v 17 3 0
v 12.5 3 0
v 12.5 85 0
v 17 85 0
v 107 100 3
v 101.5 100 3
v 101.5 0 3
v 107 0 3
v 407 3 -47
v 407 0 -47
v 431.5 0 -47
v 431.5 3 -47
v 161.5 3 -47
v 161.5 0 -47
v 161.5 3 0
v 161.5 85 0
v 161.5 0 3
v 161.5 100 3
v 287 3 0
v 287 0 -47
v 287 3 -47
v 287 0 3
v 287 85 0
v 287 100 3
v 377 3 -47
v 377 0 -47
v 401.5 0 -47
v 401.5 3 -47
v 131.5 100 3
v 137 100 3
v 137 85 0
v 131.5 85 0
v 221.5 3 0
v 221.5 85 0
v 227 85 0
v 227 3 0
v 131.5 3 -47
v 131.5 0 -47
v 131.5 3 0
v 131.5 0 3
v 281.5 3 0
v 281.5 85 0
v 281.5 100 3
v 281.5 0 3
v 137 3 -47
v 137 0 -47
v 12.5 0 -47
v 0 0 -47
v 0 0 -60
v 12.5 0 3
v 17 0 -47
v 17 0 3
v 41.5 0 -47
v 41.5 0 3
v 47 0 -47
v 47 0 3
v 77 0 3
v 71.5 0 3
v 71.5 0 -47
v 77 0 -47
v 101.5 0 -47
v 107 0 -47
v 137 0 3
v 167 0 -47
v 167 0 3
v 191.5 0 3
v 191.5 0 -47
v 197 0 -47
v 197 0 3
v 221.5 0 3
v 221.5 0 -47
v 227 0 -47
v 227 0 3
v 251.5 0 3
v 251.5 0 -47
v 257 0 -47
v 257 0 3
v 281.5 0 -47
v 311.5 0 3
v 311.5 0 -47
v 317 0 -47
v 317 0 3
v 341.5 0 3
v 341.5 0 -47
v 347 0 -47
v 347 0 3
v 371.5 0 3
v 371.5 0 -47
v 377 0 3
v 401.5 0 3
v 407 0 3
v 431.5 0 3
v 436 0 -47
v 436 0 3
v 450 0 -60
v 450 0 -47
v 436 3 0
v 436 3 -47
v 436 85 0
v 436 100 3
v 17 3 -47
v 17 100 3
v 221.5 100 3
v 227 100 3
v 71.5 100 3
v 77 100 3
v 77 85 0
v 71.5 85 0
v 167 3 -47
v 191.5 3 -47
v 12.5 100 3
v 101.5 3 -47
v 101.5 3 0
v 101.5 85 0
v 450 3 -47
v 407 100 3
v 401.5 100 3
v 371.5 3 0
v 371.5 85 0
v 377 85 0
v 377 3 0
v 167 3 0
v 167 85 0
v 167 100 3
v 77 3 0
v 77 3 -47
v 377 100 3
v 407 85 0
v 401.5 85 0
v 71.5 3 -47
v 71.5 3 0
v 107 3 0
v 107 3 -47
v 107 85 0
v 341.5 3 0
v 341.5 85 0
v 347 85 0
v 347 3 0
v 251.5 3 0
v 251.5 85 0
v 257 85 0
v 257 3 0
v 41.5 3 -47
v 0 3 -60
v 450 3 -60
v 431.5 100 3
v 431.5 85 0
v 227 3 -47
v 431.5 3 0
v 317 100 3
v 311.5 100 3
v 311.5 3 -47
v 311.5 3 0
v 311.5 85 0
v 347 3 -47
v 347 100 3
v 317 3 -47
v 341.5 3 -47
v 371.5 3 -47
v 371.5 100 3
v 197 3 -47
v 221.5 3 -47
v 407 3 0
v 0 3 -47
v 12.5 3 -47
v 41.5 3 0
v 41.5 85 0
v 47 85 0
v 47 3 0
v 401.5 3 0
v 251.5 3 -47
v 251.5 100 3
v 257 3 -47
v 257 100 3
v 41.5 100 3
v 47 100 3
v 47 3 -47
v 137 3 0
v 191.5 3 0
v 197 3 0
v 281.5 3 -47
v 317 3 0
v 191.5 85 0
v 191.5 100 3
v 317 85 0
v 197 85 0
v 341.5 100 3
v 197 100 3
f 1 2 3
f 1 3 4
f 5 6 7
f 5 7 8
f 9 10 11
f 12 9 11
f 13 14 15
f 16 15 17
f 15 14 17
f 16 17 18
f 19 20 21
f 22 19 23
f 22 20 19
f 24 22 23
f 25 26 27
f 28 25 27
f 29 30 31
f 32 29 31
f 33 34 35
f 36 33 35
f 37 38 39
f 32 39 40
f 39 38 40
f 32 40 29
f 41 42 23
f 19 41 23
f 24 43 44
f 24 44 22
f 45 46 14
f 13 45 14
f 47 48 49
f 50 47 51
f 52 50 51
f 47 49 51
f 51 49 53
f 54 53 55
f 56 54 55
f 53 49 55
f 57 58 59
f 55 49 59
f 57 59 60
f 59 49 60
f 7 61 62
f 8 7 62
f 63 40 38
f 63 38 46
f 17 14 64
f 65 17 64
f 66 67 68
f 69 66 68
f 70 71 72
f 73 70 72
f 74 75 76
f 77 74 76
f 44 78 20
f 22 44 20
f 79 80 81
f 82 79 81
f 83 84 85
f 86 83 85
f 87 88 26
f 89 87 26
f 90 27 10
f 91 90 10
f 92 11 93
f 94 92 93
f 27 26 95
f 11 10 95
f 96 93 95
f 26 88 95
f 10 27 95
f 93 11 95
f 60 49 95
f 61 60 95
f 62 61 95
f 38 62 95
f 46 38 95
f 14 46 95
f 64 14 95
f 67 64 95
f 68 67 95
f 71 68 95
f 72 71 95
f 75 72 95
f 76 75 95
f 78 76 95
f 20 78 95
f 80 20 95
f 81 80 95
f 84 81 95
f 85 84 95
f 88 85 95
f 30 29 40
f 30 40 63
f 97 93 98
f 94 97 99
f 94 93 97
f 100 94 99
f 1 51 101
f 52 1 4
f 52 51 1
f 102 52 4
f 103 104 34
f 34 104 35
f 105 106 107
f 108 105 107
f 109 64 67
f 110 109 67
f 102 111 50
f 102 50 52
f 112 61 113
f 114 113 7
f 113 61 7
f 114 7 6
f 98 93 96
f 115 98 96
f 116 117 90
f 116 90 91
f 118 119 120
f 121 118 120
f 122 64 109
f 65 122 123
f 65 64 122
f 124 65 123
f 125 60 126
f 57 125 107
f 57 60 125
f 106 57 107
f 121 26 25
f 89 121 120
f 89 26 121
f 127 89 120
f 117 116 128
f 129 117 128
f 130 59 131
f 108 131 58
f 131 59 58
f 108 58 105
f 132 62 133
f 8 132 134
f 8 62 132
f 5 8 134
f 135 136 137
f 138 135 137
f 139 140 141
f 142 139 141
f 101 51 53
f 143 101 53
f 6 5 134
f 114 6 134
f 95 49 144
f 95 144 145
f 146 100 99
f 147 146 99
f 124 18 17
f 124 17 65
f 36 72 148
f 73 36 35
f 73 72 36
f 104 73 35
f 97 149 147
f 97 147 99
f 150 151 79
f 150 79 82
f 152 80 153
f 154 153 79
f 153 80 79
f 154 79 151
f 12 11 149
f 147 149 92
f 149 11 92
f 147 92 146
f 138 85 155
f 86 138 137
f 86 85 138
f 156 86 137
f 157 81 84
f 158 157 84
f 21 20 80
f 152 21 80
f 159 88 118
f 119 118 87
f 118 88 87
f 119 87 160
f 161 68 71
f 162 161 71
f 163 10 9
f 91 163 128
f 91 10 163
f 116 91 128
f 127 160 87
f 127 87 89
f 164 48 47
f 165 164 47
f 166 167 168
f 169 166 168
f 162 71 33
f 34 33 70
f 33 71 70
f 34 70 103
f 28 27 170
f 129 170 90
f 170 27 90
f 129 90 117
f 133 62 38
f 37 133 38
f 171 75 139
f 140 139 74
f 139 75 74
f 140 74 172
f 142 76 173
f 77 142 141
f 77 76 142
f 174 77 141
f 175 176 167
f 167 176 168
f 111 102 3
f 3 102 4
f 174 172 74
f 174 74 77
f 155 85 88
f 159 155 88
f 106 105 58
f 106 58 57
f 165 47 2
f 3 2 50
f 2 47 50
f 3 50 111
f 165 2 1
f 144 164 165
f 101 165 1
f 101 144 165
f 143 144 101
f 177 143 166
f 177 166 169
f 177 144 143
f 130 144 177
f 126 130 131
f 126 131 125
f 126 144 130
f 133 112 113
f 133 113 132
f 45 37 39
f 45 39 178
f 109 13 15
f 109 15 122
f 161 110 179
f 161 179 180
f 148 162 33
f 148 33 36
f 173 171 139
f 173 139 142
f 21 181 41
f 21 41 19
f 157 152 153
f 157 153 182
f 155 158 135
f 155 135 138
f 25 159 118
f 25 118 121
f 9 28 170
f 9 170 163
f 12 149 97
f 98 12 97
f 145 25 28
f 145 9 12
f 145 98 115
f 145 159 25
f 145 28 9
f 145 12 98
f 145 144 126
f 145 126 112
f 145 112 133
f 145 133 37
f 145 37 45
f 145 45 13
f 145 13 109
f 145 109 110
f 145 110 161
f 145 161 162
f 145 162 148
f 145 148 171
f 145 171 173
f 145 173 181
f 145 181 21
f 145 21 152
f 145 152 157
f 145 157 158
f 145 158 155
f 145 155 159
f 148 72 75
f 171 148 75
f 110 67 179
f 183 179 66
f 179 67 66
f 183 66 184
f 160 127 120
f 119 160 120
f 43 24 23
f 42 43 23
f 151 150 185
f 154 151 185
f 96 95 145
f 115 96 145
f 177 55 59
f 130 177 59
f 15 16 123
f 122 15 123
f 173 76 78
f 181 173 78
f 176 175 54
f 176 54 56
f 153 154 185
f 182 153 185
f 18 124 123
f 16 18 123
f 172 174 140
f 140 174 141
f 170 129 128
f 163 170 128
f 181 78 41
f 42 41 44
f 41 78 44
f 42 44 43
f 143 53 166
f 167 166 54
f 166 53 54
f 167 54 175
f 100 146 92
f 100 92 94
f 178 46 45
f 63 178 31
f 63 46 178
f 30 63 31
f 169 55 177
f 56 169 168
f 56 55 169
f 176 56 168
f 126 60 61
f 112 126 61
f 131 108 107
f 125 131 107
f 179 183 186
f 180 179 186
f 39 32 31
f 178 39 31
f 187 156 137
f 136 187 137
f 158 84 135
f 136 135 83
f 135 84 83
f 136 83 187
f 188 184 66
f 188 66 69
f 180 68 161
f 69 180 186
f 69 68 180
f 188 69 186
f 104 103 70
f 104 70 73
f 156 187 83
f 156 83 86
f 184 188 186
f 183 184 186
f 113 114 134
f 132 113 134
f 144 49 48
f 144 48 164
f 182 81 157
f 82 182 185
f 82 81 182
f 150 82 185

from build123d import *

# Parameters (mm, degrees)
SKETCH_1_W          = 450
SKETCH_1_H          = 60
EXTRUDE_1_DEPTH     = 3
SKETCH_2_W          = 450
SKETCH_2_H          = 100
EXTRUDE_2_DEPTH     = 3
CUT_EXTRUDE_2_DEPTH = 465.865571967
SKETCH_3_W          = 14
SKETCH_3_H          = 50
SKETCH_3_W_2        = 24.5
SKETCH_3_W_3        = 12.5
CUT_EXTRUDE_3_DEPTH = 465.865571967


with BuildPart() as part:
    # 草图1 → 凸台-拉伸1 (new body)
    with BuildSketch(Plane(origin=(0, 0, 0), x_dir=(1, 0, 0), z_dir=(0, 1, 0))):
        with Locations((225, 30)):
            Rectangle(SKETCH_1_W, SKETCH_1_H)
    extrude(amount=EXTRUDE_1_DEPTH)

    # 草图2 → 凸台-拉伸2 (add)
    with BuildSketch(Plane.XY):
        with Locations((225, 50)):
            Rectangle(SKETCH_2_W, SKETCH_2_H)
    extrude(amount=EXTRUDE_2_DEPTH)

    # 草图6 → 切除-拉伸2 (cut, through all)
    with BuildSketch(Plane(origin=(450, 0, 0), x_dir=(0, 0, -1), z_dir=(1, 0, 0))):
        Polygon((-3, 100), (0, 85), (0, 100), align=None)
    extrude(amount=-CUT_EXTRUDE_2_DEPTH, mode=Mode.SUBTRACT)

    # 草图3 → 切除-拉伸3 (cut, through all)
    with BuildSketch(Plane.XZ):
        with Locations((443, -22)):
            Rectangle(SKETCH_3_W, SKETCH_3_H)
        with Locations((419.25, -22)):
            Rectangle(SKETCH_3_W_2, SKETCH_3_H)
        with Locations((389.25, -22)):
            Rectangle(SKETCH_3_W_2, SKETCH_3_H)
        with Locations((359.25, -22)):
            Rectangle(SKETCH_3_W_2, SKETCH_3_H)
        with Locations((329.25, -22)):
            Rectangle(SKETCH_3_W_2, SKETCH_3_H)
        with Locations((299.25, -22)):
            Rectangle(SKETCH_3_W_2, SKETCH_3_H)
        with Locations((269.25, -22)):
            Rectangle(SKETCH_3_W_2, SKETCH_3_H)
        with Locations((239.25, -22)):
            Rectangle(SKETCH_3_W_2, SKETCH_3_H)
        with Locations((209.25, -22)):
            Rectangle(SKETCH_3_W_2, SKETCH_3_H)
        with Locations((179.25, -22)):
            Rectangle(SKETCH_3_W_2, SKETCH_3_H)
        with Locations((149.25, -22)):
            Rectangle(SKETCH_3_W_2, SKETCH_3_H)
        with Locations((119.25, -22)):
            Rectangle(SKETCH_3_W_2, SKETCH_3_H)
        with Locations((89.25, -22)):
            Rectangle(SKETCH_3_W_2, SKETCH_3_H)
        with Locations((59.25, -22)):
            Rectangle(SKETCH_3_W_2, SKETCH_3_H)
        with Locations((29.25, -22)):
            Rectangle(SKETCH_3_W_2, SKETCH_3_H)
        with Locations((6.25, -22)):
            Rectangle(SKETCH_3_W_3, SKETCH_3_H)
    extrude(amount=-CUT_EXTRUDE_3_DEPTH, mode=Mode.SUBTRACT)


solid = part.part
